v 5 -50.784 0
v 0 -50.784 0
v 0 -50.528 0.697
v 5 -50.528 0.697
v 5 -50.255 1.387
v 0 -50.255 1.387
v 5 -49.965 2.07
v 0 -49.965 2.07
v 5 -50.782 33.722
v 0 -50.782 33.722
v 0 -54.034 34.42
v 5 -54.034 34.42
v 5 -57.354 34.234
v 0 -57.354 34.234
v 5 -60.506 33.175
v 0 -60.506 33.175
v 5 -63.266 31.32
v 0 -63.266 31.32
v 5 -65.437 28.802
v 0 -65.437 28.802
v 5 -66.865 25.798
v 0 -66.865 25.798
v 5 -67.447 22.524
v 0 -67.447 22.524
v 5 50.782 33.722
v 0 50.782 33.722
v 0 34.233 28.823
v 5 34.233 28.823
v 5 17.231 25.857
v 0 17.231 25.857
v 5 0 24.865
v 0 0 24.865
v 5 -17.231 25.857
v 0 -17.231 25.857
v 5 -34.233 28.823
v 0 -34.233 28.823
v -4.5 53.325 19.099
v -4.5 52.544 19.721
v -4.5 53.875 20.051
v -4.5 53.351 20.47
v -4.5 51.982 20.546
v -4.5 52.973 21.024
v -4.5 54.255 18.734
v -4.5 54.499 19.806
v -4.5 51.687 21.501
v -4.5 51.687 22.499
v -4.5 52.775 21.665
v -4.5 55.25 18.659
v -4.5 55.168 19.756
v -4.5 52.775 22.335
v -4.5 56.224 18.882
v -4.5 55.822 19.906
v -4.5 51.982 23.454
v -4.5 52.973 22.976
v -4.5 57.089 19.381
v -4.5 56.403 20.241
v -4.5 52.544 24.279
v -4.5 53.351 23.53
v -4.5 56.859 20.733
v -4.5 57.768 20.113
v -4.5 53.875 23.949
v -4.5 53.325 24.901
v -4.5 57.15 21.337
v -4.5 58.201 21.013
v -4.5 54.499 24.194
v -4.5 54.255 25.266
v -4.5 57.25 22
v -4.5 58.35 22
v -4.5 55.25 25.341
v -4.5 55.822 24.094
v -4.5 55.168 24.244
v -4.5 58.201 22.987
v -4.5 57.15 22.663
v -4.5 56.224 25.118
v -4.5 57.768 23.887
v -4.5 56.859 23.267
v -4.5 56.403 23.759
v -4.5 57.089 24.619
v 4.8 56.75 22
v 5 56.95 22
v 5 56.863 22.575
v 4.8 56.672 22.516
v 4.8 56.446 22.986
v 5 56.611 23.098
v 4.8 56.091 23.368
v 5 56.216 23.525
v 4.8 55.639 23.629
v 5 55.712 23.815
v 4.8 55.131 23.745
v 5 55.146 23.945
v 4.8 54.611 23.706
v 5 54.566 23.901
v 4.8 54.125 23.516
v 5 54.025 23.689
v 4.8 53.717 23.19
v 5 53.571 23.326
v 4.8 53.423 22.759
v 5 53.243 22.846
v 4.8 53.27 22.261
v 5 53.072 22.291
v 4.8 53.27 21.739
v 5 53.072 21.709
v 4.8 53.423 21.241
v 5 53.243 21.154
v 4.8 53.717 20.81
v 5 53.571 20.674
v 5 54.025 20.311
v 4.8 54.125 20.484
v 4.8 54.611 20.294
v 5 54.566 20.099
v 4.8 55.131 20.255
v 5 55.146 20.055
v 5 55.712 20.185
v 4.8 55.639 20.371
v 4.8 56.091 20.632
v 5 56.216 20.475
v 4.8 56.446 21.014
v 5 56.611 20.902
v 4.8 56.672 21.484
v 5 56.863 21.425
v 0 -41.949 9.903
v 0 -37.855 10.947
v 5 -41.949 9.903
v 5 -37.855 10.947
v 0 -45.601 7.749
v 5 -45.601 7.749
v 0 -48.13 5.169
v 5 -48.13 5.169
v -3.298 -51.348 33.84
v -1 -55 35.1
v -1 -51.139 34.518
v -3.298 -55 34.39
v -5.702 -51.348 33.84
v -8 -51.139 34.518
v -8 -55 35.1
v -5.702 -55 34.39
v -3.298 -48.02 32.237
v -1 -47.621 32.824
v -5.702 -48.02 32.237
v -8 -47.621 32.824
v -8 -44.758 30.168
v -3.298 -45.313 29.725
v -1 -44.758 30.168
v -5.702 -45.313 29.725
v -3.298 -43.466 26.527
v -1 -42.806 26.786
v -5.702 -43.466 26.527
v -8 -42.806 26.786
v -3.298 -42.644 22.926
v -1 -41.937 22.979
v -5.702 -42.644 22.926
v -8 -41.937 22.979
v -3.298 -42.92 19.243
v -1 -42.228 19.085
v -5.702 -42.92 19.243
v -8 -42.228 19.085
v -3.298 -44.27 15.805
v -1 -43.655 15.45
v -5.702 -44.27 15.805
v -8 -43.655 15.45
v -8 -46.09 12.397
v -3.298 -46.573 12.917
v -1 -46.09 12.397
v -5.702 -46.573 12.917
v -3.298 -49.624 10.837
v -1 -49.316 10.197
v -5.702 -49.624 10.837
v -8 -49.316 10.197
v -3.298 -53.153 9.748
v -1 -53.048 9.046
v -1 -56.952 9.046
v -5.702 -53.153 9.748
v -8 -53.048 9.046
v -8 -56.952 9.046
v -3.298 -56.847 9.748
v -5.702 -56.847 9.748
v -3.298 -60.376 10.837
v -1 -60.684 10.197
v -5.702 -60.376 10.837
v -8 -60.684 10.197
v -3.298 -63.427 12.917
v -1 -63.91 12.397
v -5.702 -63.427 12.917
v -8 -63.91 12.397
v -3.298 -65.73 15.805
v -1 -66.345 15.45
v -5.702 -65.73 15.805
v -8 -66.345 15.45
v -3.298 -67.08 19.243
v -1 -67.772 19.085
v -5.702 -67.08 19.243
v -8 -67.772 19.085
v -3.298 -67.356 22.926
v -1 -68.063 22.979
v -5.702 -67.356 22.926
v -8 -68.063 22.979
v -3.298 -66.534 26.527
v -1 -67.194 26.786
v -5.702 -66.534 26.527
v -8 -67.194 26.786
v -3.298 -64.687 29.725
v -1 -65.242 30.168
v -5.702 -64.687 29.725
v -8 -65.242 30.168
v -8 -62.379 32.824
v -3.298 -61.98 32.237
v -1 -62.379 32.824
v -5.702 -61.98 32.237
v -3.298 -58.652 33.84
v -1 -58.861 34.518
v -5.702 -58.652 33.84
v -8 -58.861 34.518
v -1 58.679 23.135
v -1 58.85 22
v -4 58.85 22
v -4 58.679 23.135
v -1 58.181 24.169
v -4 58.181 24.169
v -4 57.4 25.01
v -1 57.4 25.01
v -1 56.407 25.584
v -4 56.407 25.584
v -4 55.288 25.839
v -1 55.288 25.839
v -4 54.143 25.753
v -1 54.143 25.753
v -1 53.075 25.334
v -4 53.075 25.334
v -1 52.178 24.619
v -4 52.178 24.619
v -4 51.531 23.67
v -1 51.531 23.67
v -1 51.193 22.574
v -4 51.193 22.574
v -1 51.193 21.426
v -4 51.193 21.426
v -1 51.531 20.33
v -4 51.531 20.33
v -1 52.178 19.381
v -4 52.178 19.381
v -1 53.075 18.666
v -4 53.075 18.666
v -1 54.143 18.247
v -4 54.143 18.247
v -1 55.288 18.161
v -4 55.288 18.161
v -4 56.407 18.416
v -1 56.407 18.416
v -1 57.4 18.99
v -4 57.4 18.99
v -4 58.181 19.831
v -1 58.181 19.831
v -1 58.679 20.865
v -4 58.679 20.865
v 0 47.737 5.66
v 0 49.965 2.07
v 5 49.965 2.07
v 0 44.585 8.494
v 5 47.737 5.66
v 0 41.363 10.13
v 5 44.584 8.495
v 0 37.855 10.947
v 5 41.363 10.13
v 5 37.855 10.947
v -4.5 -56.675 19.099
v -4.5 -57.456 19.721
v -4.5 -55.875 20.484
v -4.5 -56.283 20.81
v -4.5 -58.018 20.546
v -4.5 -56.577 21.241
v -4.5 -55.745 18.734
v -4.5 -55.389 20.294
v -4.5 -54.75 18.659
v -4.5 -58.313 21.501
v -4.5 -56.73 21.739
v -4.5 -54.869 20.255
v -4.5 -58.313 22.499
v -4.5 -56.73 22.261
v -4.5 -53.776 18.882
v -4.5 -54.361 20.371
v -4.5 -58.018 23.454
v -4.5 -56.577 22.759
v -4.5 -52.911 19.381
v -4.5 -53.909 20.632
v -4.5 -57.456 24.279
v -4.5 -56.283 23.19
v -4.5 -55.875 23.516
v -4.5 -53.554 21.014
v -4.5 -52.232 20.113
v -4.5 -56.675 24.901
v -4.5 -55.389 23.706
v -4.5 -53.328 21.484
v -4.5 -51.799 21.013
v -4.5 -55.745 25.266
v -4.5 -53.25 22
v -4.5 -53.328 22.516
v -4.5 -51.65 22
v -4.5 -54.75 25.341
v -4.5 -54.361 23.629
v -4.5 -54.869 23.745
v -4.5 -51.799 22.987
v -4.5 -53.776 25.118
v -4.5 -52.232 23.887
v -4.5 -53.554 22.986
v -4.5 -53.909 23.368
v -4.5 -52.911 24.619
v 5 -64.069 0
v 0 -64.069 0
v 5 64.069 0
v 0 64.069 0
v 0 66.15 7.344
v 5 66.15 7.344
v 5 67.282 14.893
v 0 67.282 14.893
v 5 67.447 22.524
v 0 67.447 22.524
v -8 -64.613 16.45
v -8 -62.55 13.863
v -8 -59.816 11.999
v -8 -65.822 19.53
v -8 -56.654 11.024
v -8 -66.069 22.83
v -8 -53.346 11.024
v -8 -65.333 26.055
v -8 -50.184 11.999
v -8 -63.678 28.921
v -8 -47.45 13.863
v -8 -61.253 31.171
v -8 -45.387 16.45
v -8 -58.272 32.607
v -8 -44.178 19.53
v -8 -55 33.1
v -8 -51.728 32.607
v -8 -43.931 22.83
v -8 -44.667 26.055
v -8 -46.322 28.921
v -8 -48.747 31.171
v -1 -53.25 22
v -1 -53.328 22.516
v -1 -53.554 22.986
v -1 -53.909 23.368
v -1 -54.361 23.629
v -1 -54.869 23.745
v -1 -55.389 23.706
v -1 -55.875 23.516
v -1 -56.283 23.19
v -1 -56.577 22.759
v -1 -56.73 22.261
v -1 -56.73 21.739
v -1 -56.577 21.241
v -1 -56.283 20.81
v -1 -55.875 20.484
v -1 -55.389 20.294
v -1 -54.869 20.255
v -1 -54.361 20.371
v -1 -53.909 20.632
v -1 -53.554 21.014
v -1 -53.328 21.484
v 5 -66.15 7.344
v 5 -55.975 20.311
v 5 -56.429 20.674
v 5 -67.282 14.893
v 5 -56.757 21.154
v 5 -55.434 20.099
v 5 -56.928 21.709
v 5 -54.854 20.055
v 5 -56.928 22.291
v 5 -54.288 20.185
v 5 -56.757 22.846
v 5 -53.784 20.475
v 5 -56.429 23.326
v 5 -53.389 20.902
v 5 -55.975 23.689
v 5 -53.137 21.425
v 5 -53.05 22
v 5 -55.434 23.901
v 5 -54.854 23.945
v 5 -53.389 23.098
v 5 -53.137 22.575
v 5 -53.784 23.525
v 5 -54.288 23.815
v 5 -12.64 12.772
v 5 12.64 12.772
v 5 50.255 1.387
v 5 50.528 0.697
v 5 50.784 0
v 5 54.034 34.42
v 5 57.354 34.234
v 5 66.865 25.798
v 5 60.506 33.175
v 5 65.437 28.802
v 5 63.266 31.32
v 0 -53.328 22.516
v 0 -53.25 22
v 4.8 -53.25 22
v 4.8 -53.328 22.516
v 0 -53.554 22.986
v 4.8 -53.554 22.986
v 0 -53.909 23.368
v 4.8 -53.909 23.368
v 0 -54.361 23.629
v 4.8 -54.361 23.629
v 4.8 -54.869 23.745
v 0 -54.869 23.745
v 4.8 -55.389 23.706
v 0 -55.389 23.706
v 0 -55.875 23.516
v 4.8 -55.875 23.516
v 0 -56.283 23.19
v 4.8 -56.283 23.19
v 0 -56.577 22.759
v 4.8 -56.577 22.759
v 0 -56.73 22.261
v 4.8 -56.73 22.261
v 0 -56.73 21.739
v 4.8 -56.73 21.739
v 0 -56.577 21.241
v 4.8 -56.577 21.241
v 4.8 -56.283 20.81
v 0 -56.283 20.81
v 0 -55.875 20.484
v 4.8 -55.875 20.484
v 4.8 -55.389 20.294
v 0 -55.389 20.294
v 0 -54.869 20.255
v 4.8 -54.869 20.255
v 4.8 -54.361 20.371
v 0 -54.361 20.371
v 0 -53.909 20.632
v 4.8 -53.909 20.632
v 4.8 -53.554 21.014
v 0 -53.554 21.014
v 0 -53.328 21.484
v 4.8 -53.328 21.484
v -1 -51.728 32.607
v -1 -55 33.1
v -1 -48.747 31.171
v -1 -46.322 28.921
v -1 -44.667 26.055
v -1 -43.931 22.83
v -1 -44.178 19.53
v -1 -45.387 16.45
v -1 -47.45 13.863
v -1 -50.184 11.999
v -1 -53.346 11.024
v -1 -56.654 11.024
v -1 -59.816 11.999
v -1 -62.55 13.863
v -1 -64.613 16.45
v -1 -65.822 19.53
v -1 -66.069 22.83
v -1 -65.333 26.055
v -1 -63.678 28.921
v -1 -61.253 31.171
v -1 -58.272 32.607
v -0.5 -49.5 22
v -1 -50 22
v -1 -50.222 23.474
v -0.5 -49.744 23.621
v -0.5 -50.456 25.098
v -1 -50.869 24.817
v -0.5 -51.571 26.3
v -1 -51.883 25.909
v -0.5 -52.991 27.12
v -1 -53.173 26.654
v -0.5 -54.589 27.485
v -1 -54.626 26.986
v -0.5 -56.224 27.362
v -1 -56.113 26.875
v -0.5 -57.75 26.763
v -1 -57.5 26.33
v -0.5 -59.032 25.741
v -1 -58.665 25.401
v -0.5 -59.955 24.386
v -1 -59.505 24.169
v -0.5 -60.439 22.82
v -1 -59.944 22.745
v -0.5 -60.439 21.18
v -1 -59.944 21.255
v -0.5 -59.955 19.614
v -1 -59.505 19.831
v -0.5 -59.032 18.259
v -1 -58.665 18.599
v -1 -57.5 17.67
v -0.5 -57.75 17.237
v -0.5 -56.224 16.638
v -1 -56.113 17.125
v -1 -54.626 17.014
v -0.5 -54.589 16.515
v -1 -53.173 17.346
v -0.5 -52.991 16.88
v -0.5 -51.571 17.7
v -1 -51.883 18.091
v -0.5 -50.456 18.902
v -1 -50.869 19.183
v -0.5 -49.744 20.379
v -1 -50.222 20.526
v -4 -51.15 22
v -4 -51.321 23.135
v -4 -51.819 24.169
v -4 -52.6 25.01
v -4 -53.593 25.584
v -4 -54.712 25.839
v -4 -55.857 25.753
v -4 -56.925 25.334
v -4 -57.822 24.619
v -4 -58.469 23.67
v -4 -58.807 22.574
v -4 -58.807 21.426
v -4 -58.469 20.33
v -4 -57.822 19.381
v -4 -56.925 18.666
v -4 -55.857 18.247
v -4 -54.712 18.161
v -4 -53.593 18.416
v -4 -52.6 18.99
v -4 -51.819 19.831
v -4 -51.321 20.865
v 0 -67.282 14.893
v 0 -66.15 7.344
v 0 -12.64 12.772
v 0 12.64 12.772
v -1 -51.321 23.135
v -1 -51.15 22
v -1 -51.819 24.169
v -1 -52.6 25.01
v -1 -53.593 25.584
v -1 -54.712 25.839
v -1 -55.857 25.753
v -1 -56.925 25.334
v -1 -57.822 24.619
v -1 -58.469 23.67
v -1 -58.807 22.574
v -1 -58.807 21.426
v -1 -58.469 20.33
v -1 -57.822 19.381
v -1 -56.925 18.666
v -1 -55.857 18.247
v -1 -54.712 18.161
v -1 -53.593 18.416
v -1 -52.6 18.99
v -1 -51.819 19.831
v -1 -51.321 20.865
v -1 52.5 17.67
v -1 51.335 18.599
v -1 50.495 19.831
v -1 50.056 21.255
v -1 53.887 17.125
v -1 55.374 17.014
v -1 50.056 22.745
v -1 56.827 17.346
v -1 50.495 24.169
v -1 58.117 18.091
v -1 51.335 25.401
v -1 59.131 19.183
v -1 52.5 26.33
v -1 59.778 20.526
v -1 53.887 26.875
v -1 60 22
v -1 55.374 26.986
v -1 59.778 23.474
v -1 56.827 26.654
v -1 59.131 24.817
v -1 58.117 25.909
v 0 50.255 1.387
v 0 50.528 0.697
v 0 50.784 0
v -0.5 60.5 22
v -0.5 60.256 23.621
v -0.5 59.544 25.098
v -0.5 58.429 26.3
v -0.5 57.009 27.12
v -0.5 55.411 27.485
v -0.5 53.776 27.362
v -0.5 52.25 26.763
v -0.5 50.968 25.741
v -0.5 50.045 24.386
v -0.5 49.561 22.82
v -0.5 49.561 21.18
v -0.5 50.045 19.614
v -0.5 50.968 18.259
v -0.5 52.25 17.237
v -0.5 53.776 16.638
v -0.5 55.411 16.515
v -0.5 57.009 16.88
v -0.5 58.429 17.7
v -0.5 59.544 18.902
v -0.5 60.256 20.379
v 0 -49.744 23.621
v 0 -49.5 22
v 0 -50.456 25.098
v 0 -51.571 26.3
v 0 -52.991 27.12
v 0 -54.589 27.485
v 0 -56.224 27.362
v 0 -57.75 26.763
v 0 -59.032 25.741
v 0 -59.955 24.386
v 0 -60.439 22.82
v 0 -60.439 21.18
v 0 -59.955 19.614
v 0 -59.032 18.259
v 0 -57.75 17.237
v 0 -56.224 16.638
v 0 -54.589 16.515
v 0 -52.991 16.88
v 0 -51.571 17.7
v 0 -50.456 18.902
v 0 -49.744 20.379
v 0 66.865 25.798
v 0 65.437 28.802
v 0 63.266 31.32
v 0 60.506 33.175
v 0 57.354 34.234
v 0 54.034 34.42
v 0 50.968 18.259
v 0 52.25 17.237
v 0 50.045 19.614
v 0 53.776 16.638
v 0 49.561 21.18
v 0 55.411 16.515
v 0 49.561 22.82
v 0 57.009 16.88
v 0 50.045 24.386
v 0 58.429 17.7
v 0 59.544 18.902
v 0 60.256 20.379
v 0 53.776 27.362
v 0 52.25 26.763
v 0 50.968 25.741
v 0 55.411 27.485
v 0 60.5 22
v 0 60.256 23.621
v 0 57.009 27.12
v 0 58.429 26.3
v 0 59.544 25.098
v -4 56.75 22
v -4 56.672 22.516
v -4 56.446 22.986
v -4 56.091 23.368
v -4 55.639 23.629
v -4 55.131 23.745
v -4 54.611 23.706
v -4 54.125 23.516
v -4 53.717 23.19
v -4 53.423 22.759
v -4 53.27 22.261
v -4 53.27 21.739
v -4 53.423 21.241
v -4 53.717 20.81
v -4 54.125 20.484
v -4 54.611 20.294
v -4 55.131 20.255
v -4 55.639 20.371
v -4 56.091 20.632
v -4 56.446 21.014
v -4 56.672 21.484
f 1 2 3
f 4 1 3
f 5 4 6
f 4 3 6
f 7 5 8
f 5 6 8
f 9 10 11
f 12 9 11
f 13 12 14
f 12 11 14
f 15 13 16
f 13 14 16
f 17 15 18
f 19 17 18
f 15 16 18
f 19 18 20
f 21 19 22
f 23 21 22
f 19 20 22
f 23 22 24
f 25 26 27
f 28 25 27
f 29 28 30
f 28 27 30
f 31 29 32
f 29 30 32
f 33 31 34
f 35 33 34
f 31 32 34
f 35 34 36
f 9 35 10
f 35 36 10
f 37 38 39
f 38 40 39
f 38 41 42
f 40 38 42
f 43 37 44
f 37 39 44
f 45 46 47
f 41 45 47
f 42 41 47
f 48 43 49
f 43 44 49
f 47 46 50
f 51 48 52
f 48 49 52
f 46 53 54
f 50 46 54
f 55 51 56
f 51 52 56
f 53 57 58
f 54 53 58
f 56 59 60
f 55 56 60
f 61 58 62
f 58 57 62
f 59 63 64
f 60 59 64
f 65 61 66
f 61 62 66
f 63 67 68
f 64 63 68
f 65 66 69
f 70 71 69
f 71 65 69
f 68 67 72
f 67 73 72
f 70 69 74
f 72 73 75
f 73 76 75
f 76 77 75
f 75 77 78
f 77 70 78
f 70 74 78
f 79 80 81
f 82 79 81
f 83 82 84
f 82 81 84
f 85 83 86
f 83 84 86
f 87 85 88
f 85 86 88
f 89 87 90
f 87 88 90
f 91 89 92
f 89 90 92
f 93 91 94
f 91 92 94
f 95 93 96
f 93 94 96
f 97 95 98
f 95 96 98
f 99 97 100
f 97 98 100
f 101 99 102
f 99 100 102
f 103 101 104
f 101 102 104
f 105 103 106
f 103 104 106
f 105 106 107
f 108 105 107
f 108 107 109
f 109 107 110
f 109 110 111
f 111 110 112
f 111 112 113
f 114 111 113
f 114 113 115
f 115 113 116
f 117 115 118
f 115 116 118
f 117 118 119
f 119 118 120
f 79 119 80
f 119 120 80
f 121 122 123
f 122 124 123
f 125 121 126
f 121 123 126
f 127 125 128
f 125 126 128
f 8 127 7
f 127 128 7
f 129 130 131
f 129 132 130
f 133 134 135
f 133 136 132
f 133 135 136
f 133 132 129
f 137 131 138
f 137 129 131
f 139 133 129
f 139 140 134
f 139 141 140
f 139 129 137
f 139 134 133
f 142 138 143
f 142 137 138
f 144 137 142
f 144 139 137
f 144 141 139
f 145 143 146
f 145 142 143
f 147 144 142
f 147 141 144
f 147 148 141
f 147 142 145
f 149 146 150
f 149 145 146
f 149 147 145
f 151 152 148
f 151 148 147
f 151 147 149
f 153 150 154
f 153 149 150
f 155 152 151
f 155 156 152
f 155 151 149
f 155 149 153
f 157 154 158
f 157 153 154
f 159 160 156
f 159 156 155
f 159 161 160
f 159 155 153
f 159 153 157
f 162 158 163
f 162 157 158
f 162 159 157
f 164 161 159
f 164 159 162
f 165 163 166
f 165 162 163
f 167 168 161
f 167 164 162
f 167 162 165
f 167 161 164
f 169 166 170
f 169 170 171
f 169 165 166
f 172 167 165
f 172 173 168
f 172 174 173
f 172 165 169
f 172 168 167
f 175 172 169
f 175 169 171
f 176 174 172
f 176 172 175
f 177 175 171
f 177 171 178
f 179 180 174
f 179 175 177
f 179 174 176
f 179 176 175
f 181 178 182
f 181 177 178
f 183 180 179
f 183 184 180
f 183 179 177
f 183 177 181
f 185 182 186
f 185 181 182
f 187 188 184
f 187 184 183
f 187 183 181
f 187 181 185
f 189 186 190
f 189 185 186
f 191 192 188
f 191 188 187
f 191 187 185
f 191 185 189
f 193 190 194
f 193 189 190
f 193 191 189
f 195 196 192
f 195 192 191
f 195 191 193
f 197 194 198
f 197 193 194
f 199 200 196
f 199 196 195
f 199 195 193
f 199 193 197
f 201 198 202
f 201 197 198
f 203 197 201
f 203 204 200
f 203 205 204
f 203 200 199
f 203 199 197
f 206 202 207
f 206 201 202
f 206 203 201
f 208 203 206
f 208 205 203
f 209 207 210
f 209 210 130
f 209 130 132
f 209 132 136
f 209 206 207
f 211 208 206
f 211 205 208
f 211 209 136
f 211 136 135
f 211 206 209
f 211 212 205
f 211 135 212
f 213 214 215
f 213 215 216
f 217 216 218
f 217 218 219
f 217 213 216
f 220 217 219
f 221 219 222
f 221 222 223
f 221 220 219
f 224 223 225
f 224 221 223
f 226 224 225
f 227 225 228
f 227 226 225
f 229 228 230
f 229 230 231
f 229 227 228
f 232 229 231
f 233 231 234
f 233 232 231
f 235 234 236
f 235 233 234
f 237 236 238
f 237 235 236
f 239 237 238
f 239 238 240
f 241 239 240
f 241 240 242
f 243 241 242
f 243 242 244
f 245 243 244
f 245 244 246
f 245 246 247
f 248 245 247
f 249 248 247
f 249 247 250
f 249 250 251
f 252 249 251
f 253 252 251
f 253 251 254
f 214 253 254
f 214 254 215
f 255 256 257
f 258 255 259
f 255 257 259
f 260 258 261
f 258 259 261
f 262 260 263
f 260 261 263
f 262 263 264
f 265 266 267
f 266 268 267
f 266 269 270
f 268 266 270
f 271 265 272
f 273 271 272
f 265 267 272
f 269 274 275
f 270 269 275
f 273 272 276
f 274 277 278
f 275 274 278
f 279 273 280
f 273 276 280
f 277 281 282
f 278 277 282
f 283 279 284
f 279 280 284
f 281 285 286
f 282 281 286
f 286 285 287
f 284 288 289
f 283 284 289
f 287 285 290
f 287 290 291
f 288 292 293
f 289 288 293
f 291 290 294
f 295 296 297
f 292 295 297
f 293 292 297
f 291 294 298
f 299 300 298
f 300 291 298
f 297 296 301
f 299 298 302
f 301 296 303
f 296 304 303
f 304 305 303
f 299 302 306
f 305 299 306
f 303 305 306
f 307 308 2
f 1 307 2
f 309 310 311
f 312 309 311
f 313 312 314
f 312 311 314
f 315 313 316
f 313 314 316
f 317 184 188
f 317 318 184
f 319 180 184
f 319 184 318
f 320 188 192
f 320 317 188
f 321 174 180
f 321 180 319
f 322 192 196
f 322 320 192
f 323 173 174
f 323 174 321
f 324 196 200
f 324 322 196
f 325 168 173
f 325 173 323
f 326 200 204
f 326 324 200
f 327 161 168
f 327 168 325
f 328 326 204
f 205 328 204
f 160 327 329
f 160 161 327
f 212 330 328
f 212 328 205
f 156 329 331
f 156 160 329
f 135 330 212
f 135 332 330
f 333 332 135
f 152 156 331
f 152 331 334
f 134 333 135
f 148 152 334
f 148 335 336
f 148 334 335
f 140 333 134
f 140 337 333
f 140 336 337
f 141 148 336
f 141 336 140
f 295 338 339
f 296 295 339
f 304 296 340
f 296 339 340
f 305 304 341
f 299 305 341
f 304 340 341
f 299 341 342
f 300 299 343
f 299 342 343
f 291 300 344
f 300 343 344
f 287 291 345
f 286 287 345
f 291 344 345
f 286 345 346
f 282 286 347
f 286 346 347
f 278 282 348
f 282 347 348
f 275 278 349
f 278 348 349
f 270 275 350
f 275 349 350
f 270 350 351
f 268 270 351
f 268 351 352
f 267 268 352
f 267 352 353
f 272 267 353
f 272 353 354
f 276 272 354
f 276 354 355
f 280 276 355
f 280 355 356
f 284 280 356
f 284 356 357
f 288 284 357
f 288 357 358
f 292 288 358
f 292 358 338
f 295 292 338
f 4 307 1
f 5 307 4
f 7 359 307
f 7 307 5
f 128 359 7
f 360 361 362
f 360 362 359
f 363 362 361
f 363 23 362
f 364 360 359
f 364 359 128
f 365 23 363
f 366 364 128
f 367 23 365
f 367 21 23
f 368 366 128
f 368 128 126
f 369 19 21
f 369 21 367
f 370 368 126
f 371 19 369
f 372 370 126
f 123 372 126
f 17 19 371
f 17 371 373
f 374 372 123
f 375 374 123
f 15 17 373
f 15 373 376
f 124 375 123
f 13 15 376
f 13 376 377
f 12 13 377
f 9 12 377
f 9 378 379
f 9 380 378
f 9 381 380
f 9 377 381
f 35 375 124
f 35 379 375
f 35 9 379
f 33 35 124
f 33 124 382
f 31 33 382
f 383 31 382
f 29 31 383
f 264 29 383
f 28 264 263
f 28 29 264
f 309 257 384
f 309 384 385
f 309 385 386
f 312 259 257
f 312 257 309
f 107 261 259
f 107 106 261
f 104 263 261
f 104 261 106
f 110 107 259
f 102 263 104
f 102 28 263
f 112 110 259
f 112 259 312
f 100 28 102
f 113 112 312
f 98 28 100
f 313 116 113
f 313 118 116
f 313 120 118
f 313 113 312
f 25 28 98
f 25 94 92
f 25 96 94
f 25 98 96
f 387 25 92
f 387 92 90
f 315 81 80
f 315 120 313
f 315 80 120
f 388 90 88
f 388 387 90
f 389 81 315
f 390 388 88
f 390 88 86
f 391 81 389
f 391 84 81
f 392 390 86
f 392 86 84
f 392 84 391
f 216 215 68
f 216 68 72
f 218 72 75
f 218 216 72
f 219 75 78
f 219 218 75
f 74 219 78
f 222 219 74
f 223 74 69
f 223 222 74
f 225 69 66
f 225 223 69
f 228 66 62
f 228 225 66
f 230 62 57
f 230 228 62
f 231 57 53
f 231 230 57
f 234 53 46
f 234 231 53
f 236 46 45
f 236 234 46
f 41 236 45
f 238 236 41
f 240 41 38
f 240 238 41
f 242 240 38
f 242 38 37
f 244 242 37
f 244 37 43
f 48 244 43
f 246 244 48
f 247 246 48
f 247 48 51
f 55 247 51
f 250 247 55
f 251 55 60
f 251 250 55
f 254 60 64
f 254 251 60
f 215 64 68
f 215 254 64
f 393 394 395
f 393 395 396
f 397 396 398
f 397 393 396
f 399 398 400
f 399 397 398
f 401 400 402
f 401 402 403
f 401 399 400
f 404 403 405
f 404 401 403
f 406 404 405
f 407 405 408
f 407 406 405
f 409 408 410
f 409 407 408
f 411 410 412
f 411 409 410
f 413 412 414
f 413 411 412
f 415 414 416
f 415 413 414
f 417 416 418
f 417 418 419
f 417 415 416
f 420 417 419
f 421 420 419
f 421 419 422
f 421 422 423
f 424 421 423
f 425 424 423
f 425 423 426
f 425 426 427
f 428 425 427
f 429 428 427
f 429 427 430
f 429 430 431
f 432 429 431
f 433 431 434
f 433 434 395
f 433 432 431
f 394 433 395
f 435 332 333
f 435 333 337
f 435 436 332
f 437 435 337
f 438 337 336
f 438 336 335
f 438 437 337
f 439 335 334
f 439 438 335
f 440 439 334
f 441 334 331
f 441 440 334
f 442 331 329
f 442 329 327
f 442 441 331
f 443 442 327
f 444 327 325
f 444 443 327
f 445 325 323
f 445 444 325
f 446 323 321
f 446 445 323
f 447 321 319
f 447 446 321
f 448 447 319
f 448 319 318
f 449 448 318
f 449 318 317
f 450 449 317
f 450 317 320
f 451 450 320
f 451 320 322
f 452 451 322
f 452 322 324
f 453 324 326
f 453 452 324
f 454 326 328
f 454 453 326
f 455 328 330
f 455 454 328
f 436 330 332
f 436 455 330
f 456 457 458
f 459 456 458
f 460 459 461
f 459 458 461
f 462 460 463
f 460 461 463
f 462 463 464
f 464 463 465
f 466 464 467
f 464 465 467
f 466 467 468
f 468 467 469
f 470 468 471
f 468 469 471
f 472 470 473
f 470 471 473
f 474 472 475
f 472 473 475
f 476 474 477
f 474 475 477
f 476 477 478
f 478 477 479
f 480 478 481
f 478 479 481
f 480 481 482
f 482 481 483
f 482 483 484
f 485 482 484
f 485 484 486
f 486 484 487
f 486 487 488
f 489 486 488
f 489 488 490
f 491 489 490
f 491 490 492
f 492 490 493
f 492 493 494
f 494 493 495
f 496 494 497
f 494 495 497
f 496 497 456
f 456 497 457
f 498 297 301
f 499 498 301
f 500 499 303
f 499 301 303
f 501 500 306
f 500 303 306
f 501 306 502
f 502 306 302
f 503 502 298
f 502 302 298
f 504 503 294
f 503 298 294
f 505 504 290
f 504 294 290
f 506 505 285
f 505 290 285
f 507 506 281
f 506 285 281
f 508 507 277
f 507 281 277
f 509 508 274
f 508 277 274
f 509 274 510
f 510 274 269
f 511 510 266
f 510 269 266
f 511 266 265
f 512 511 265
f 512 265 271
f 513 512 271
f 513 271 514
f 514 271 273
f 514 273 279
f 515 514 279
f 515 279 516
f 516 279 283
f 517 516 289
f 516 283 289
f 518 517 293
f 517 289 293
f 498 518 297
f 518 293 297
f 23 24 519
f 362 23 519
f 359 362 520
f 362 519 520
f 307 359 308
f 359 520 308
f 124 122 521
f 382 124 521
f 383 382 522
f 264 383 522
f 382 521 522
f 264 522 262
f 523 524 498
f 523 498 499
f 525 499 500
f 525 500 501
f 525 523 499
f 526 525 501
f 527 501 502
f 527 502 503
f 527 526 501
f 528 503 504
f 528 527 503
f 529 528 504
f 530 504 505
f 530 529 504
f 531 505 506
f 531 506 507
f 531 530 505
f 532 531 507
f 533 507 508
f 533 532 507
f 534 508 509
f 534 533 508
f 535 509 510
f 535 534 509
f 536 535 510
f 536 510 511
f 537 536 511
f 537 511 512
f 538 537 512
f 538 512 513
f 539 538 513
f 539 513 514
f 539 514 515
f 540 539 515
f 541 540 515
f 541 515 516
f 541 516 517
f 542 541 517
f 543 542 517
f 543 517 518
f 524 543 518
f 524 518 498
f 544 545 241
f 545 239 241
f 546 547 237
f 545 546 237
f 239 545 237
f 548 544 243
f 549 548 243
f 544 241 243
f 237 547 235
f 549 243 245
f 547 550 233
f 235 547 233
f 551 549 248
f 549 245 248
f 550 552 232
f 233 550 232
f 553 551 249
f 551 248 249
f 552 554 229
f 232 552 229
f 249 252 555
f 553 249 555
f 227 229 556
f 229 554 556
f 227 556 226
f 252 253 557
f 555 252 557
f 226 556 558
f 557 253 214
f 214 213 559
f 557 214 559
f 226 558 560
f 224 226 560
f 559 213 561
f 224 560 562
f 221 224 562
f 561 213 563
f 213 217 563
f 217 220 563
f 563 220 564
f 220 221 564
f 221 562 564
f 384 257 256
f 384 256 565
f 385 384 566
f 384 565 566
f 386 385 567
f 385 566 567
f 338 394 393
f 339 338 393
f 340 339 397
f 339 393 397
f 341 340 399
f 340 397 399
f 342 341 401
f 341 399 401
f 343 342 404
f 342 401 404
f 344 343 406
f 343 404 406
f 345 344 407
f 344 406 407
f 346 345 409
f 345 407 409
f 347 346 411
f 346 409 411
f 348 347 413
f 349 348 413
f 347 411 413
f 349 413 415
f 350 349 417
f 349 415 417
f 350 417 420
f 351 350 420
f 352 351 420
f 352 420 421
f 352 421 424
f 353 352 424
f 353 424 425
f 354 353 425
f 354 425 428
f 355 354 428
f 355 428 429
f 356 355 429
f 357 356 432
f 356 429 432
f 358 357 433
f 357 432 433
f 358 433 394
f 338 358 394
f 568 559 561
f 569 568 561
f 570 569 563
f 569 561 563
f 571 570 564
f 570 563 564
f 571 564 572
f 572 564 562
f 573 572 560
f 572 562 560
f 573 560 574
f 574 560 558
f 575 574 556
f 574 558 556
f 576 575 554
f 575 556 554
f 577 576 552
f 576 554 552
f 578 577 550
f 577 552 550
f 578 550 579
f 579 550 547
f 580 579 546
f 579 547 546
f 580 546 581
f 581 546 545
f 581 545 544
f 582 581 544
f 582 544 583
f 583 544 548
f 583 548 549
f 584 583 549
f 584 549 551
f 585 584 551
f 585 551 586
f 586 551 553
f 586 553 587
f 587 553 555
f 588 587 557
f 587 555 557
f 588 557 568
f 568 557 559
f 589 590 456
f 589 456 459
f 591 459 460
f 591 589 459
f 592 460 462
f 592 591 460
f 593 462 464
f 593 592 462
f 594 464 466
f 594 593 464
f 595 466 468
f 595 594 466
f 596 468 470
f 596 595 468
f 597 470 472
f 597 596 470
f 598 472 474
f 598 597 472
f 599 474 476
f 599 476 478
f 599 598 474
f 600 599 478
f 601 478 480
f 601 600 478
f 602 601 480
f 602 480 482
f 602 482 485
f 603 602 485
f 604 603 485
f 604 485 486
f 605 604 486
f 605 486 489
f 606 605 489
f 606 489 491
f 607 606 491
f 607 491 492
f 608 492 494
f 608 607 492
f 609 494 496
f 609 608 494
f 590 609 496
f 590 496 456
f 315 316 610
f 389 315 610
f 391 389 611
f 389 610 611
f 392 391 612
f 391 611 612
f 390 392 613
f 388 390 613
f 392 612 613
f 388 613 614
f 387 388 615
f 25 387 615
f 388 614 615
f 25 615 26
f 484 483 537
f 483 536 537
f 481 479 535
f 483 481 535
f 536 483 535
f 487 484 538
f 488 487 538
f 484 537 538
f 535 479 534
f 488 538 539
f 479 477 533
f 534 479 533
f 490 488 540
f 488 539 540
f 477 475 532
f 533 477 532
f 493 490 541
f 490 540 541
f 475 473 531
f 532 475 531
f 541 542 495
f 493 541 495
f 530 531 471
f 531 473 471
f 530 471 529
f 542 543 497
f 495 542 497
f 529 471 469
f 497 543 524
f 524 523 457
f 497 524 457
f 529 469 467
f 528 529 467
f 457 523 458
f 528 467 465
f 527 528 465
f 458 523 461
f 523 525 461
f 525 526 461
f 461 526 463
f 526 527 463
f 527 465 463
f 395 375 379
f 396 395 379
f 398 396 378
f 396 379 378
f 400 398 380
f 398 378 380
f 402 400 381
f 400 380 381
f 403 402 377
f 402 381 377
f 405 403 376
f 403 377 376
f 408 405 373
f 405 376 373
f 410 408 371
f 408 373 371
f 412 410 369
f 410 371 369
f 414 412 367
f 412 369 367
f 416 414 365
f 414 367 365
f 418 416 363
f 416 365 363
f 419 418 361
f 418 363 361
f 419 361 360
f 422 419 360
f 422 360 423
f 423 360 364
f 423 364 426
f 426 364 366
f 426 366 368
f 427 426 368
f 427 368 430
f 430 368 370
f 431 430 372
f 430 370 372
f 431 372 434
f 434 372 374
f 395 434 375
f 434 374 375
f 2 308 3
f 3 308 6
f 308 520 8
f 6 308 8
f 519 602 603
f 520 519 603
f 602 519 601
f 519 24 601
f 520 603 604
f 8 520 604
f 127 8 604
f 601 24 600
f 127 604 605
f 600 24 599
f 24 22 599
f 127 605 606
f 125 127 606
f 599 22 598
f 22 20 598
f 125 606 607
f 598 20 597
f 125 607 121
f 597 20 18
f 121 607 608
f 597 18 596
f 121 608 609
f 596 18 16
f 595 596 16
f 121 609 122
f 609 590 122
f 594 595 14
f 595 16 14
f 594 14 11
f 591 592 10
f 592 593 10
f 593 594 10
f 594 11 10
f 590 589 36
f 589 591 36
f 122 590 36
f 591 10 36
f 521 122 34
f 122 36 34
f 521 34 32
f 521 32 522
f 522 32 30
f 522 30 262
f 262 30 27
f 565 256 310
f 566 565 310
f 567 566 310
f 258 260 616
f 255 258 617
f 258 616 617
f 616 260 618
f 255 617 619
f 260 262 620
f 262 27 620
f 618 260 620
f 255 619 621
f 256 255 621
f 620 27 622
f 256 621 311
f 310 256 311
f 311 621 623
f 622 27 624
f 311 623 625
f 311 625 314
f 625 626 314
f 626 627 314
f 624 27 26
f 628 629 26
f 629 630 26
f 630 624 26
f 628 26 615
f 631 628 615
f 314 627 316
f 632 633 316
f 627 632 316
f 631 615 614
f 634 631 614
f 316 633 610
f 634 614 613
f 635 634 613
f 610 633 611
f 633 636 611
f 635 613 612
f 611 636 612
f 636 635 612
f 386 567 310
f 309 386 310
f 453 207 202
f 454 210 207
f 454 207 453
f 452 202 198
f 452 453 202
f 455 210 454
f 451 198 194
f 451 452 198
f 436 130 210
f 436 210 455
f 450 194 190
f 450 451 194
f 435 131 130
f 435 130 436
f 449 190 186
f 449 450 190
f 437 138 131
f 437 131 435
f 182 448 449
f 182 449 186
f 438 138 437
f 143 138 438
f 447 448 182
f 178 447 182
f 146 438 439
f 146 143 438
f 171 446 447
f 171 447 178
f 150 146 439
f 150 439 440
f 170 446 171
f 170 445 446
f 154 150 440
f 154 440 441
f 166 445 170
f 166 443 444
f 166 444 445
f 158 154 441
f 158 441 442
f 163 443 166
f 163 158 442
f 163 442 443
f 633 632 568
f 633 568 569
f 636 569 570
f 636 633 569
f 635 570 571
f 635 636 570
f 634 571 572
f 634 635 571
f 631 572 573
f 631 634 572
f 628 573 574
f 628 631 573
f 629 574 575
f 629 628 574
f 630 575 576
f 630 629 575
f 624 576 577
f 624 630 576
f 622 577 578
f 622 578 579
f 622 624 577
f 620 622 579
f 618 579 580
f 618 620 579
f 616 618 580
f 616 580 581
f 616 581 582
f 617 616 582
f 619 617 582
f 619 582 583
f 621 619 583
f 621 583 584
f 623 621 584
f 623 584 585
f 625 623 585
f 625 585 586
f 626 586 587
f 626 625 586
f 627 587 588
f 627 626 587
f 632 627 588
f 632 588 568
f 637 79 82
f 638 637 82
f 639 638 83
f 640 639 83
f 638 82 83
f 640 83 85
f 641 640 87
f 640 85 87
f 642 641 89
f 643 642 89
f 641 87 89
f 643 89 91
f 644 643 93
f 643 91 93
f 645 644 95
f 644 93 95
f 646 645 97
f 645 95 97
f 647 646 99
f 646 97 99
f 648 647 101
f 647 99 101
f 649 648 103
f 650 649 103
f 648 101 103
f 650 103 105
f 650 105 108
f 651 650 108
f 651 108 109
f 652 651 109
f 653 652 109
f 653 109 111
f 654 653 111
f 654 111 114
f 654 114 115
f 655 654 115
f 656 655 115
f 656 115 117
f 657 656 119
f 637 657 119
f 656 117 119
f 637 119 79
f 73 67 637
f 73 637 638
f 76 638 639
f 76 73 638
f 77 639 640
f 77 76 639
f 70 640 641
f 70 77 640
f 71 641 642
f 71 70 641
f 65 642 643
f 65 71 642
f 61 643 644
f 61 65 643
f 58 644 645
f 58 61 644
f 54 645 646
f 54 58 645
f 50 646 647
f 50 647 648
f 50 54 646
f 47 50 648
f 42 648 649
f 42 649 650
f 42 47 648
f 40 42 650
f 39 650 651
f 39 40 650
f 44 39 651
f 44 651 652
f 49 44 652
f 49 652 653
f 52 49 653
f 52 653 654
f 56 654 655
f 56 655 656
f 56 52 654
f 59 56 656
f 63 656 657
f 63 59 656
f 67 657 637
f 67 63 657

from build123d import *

# Parameters (mm, degrees)
F0_R     = 11
F0_R_2   = 5.5
F0_R_3   = 3.85
F0_R_4   = 1.75
F1_DEPTH = 5
F2_DEPTH = 1
F3_DEPTH = 4.5
F4_SIZE  = 0.2
F8_R     = 15
F9_SIZE  = 0.5


with BuildPart() as f1:
    # F0 (on Right) → F1 (new body)
    with BuildSketch(Plane.YZ):
        with BuildLine():
            Line((50.7842712475, 0), (64.0685424949, 0))
            ThreePointArc((64.0685424949, 0), (66.8362852728, 11.1002668566), (67.4468850178, 22.5240793692))
            ThreePointArc((67.4468850178, 22.5240793692), (61.9483818424, 32.3401932092), (50.7823831309, 33.7222571963))
            ThreePointArc((50.7823831309, 33.7222571963), (0, 24.8645597266), (-50.7823831309, 33.7222571963))
            ThreePointArc((-50.7823831309, 33.7222571963), (-61.9483818424, 32.3401932092), (-67.4468850178, 22.5240793692))
            ThreePointArc((-67.4468850178, 22.5240793692), (-66.8362852728, 11.1002668566), (-64.0685424949, 0))
            Line((-64.0685424949, 0), (-50.7842712475, 0))
            ThreePointArc((-50.7842712475, 0), (-48.267413936, 5.3636056657), (-44.7455462717, 10.1279822902))
            ThreePointArc((-44.7455462717, 10.1279822902), (0, 13), (44.7455462717, 10.1279822902))
            ThreePointArc((44.7455462717, 10.1279822902), (48.267413936, 5.3636056657), (50.7842712475, 0))
        make_face()
        with Locations((-55, 22)):
            Circle(F0_R, mode=Mode.SUBTRACT)
        with Locations((55, 22)):
            Circle(F0_R, mode=Mode.SUBTRACT)
        with Locations((55, 22)):
            Circle(F0_R)
        with Locations((55, 22)):
            Circle(F0_R_2, mode=Mode.SUBTRACT)
        with Locations((55, 22)):
            Circle(F0_R_2)
        with Locations((55, 22)):
            Circle(F0_R_3, mode=Mode.SUBTRACT)
        with Locations((55, 22)):
            Circle(F0_R_3)
        with Locations((55, 22)):
            Circle(F0_R_4, mode=Mode.SUBTRACT)
        with Locations((-55, 22)):
            Circle(F0_R)
        with Locations((-55, 22)):
            Circle(F0_R_2, mode=Mode.SUBTRACT)
        with Locations((-55, 22)):
            Circle(F0_R_2)
        with Locations((-55, 22)):
            Circle(F0_R_3, mode=Mode.SUBTRACT)
        with Locations((-55, 22)):
            Circle(F0_R_3)
        with Locations((-55, 22)):
            Circle(F0_R_4, mode=Mode.SUBTRACT)
    extrude(amount=F1_DEPTH)

    # F0 (on Right) → F2 (join)
    with BuildSketch(Plane.YZ):
        with Locations((-55, 22)):
            Circle(F0_R_2)
        with Locations((-55, 22)):
            Circle(F0_R_3, mode=Mode.SUBTRACT)
        with Locations((55, 22)):
            Circle(F0_R_2)
        with Locations((55, 22)):
            Circle(F0_R_3, mode=Mode.SUBTRACT)
        with Locations((-55, 22)):
            Circle(F0_R_3)
        with Locations((-55, 22)):
            Circle(F0_R_4, mode=Mode.SUBTRACT)
        with Locations((55, 22)):
            Circle(F0_R_3)
        with Locations((55, 22)):
            Circle(F0_R_4, mode=Mode.SUBTRACT)
    extrude(amount=-F2_DEPTH)

    # F0 (on Right) → F3 (join)
    with BuildSketch(Plane.YZ):
        with Locations((55, 22)):
            Circle(F0_R_3)
        with Locations((55, 22)):
            Circle(F0_R_4, mode=Mode.SUBTRACT)
        with Locations((-55, 22)):
            Circle(F0_R_3)
        with Locations((-55, 22)):
            Circle(F0_R_4, mode=Mode.SUBTRACT)
    extrude(amount=-F3_DEPTH)

    # F4
    f4_edges = [f1.edges().sort_by_distance(p)[0] for p in [
        (5, 53.25, 22),
        (5, -56.75, 22),
    ]]
    chamfer(f4_edges, length=F4_SIZE)

    # F8
    f8_edges = [f1.edges().sort_by_distance(p)[0] for p in [
        (2.5, -44.745546, 10.127982),
        (2.5, 44.745546, 10.127982),
    ]]
    fillet(f8_edges, radius=F8_R)

    # F9
    f9_edges = [f1.edges().sort_by_distance(p)[0] for p in [
        (-4.5, -58.85, 22),
        (-4.5, 51.15, 22),
        (-4.5, 53.25, 22),
        (-1, 49.5, 22),
        (-1, -60.5, 22),
    ]]
    chamfer(f9_edges, length=F9_SIZE)


with BuildPart() as f7:
    # F6 (on plane+point) → F7 (revolve)
    with BuildSketch(Plane.XZ.offset(55)):
        with BuildLine():
            Line((-8, 35.1), (-8, 33.1))
            Line((-8, 33.1), (-1, 33.1))
            Line((-1, 33.1), (-1, 35.1))
            ThreePointArc((-1, 35.1), (-4.5, 34.3), (-8, 35.1))
        make_face()
    revolve(axis=Axis((-4.5, -55, 22), (-1, 0, 0)))


solid = Compound([f1.part, f7.part])
